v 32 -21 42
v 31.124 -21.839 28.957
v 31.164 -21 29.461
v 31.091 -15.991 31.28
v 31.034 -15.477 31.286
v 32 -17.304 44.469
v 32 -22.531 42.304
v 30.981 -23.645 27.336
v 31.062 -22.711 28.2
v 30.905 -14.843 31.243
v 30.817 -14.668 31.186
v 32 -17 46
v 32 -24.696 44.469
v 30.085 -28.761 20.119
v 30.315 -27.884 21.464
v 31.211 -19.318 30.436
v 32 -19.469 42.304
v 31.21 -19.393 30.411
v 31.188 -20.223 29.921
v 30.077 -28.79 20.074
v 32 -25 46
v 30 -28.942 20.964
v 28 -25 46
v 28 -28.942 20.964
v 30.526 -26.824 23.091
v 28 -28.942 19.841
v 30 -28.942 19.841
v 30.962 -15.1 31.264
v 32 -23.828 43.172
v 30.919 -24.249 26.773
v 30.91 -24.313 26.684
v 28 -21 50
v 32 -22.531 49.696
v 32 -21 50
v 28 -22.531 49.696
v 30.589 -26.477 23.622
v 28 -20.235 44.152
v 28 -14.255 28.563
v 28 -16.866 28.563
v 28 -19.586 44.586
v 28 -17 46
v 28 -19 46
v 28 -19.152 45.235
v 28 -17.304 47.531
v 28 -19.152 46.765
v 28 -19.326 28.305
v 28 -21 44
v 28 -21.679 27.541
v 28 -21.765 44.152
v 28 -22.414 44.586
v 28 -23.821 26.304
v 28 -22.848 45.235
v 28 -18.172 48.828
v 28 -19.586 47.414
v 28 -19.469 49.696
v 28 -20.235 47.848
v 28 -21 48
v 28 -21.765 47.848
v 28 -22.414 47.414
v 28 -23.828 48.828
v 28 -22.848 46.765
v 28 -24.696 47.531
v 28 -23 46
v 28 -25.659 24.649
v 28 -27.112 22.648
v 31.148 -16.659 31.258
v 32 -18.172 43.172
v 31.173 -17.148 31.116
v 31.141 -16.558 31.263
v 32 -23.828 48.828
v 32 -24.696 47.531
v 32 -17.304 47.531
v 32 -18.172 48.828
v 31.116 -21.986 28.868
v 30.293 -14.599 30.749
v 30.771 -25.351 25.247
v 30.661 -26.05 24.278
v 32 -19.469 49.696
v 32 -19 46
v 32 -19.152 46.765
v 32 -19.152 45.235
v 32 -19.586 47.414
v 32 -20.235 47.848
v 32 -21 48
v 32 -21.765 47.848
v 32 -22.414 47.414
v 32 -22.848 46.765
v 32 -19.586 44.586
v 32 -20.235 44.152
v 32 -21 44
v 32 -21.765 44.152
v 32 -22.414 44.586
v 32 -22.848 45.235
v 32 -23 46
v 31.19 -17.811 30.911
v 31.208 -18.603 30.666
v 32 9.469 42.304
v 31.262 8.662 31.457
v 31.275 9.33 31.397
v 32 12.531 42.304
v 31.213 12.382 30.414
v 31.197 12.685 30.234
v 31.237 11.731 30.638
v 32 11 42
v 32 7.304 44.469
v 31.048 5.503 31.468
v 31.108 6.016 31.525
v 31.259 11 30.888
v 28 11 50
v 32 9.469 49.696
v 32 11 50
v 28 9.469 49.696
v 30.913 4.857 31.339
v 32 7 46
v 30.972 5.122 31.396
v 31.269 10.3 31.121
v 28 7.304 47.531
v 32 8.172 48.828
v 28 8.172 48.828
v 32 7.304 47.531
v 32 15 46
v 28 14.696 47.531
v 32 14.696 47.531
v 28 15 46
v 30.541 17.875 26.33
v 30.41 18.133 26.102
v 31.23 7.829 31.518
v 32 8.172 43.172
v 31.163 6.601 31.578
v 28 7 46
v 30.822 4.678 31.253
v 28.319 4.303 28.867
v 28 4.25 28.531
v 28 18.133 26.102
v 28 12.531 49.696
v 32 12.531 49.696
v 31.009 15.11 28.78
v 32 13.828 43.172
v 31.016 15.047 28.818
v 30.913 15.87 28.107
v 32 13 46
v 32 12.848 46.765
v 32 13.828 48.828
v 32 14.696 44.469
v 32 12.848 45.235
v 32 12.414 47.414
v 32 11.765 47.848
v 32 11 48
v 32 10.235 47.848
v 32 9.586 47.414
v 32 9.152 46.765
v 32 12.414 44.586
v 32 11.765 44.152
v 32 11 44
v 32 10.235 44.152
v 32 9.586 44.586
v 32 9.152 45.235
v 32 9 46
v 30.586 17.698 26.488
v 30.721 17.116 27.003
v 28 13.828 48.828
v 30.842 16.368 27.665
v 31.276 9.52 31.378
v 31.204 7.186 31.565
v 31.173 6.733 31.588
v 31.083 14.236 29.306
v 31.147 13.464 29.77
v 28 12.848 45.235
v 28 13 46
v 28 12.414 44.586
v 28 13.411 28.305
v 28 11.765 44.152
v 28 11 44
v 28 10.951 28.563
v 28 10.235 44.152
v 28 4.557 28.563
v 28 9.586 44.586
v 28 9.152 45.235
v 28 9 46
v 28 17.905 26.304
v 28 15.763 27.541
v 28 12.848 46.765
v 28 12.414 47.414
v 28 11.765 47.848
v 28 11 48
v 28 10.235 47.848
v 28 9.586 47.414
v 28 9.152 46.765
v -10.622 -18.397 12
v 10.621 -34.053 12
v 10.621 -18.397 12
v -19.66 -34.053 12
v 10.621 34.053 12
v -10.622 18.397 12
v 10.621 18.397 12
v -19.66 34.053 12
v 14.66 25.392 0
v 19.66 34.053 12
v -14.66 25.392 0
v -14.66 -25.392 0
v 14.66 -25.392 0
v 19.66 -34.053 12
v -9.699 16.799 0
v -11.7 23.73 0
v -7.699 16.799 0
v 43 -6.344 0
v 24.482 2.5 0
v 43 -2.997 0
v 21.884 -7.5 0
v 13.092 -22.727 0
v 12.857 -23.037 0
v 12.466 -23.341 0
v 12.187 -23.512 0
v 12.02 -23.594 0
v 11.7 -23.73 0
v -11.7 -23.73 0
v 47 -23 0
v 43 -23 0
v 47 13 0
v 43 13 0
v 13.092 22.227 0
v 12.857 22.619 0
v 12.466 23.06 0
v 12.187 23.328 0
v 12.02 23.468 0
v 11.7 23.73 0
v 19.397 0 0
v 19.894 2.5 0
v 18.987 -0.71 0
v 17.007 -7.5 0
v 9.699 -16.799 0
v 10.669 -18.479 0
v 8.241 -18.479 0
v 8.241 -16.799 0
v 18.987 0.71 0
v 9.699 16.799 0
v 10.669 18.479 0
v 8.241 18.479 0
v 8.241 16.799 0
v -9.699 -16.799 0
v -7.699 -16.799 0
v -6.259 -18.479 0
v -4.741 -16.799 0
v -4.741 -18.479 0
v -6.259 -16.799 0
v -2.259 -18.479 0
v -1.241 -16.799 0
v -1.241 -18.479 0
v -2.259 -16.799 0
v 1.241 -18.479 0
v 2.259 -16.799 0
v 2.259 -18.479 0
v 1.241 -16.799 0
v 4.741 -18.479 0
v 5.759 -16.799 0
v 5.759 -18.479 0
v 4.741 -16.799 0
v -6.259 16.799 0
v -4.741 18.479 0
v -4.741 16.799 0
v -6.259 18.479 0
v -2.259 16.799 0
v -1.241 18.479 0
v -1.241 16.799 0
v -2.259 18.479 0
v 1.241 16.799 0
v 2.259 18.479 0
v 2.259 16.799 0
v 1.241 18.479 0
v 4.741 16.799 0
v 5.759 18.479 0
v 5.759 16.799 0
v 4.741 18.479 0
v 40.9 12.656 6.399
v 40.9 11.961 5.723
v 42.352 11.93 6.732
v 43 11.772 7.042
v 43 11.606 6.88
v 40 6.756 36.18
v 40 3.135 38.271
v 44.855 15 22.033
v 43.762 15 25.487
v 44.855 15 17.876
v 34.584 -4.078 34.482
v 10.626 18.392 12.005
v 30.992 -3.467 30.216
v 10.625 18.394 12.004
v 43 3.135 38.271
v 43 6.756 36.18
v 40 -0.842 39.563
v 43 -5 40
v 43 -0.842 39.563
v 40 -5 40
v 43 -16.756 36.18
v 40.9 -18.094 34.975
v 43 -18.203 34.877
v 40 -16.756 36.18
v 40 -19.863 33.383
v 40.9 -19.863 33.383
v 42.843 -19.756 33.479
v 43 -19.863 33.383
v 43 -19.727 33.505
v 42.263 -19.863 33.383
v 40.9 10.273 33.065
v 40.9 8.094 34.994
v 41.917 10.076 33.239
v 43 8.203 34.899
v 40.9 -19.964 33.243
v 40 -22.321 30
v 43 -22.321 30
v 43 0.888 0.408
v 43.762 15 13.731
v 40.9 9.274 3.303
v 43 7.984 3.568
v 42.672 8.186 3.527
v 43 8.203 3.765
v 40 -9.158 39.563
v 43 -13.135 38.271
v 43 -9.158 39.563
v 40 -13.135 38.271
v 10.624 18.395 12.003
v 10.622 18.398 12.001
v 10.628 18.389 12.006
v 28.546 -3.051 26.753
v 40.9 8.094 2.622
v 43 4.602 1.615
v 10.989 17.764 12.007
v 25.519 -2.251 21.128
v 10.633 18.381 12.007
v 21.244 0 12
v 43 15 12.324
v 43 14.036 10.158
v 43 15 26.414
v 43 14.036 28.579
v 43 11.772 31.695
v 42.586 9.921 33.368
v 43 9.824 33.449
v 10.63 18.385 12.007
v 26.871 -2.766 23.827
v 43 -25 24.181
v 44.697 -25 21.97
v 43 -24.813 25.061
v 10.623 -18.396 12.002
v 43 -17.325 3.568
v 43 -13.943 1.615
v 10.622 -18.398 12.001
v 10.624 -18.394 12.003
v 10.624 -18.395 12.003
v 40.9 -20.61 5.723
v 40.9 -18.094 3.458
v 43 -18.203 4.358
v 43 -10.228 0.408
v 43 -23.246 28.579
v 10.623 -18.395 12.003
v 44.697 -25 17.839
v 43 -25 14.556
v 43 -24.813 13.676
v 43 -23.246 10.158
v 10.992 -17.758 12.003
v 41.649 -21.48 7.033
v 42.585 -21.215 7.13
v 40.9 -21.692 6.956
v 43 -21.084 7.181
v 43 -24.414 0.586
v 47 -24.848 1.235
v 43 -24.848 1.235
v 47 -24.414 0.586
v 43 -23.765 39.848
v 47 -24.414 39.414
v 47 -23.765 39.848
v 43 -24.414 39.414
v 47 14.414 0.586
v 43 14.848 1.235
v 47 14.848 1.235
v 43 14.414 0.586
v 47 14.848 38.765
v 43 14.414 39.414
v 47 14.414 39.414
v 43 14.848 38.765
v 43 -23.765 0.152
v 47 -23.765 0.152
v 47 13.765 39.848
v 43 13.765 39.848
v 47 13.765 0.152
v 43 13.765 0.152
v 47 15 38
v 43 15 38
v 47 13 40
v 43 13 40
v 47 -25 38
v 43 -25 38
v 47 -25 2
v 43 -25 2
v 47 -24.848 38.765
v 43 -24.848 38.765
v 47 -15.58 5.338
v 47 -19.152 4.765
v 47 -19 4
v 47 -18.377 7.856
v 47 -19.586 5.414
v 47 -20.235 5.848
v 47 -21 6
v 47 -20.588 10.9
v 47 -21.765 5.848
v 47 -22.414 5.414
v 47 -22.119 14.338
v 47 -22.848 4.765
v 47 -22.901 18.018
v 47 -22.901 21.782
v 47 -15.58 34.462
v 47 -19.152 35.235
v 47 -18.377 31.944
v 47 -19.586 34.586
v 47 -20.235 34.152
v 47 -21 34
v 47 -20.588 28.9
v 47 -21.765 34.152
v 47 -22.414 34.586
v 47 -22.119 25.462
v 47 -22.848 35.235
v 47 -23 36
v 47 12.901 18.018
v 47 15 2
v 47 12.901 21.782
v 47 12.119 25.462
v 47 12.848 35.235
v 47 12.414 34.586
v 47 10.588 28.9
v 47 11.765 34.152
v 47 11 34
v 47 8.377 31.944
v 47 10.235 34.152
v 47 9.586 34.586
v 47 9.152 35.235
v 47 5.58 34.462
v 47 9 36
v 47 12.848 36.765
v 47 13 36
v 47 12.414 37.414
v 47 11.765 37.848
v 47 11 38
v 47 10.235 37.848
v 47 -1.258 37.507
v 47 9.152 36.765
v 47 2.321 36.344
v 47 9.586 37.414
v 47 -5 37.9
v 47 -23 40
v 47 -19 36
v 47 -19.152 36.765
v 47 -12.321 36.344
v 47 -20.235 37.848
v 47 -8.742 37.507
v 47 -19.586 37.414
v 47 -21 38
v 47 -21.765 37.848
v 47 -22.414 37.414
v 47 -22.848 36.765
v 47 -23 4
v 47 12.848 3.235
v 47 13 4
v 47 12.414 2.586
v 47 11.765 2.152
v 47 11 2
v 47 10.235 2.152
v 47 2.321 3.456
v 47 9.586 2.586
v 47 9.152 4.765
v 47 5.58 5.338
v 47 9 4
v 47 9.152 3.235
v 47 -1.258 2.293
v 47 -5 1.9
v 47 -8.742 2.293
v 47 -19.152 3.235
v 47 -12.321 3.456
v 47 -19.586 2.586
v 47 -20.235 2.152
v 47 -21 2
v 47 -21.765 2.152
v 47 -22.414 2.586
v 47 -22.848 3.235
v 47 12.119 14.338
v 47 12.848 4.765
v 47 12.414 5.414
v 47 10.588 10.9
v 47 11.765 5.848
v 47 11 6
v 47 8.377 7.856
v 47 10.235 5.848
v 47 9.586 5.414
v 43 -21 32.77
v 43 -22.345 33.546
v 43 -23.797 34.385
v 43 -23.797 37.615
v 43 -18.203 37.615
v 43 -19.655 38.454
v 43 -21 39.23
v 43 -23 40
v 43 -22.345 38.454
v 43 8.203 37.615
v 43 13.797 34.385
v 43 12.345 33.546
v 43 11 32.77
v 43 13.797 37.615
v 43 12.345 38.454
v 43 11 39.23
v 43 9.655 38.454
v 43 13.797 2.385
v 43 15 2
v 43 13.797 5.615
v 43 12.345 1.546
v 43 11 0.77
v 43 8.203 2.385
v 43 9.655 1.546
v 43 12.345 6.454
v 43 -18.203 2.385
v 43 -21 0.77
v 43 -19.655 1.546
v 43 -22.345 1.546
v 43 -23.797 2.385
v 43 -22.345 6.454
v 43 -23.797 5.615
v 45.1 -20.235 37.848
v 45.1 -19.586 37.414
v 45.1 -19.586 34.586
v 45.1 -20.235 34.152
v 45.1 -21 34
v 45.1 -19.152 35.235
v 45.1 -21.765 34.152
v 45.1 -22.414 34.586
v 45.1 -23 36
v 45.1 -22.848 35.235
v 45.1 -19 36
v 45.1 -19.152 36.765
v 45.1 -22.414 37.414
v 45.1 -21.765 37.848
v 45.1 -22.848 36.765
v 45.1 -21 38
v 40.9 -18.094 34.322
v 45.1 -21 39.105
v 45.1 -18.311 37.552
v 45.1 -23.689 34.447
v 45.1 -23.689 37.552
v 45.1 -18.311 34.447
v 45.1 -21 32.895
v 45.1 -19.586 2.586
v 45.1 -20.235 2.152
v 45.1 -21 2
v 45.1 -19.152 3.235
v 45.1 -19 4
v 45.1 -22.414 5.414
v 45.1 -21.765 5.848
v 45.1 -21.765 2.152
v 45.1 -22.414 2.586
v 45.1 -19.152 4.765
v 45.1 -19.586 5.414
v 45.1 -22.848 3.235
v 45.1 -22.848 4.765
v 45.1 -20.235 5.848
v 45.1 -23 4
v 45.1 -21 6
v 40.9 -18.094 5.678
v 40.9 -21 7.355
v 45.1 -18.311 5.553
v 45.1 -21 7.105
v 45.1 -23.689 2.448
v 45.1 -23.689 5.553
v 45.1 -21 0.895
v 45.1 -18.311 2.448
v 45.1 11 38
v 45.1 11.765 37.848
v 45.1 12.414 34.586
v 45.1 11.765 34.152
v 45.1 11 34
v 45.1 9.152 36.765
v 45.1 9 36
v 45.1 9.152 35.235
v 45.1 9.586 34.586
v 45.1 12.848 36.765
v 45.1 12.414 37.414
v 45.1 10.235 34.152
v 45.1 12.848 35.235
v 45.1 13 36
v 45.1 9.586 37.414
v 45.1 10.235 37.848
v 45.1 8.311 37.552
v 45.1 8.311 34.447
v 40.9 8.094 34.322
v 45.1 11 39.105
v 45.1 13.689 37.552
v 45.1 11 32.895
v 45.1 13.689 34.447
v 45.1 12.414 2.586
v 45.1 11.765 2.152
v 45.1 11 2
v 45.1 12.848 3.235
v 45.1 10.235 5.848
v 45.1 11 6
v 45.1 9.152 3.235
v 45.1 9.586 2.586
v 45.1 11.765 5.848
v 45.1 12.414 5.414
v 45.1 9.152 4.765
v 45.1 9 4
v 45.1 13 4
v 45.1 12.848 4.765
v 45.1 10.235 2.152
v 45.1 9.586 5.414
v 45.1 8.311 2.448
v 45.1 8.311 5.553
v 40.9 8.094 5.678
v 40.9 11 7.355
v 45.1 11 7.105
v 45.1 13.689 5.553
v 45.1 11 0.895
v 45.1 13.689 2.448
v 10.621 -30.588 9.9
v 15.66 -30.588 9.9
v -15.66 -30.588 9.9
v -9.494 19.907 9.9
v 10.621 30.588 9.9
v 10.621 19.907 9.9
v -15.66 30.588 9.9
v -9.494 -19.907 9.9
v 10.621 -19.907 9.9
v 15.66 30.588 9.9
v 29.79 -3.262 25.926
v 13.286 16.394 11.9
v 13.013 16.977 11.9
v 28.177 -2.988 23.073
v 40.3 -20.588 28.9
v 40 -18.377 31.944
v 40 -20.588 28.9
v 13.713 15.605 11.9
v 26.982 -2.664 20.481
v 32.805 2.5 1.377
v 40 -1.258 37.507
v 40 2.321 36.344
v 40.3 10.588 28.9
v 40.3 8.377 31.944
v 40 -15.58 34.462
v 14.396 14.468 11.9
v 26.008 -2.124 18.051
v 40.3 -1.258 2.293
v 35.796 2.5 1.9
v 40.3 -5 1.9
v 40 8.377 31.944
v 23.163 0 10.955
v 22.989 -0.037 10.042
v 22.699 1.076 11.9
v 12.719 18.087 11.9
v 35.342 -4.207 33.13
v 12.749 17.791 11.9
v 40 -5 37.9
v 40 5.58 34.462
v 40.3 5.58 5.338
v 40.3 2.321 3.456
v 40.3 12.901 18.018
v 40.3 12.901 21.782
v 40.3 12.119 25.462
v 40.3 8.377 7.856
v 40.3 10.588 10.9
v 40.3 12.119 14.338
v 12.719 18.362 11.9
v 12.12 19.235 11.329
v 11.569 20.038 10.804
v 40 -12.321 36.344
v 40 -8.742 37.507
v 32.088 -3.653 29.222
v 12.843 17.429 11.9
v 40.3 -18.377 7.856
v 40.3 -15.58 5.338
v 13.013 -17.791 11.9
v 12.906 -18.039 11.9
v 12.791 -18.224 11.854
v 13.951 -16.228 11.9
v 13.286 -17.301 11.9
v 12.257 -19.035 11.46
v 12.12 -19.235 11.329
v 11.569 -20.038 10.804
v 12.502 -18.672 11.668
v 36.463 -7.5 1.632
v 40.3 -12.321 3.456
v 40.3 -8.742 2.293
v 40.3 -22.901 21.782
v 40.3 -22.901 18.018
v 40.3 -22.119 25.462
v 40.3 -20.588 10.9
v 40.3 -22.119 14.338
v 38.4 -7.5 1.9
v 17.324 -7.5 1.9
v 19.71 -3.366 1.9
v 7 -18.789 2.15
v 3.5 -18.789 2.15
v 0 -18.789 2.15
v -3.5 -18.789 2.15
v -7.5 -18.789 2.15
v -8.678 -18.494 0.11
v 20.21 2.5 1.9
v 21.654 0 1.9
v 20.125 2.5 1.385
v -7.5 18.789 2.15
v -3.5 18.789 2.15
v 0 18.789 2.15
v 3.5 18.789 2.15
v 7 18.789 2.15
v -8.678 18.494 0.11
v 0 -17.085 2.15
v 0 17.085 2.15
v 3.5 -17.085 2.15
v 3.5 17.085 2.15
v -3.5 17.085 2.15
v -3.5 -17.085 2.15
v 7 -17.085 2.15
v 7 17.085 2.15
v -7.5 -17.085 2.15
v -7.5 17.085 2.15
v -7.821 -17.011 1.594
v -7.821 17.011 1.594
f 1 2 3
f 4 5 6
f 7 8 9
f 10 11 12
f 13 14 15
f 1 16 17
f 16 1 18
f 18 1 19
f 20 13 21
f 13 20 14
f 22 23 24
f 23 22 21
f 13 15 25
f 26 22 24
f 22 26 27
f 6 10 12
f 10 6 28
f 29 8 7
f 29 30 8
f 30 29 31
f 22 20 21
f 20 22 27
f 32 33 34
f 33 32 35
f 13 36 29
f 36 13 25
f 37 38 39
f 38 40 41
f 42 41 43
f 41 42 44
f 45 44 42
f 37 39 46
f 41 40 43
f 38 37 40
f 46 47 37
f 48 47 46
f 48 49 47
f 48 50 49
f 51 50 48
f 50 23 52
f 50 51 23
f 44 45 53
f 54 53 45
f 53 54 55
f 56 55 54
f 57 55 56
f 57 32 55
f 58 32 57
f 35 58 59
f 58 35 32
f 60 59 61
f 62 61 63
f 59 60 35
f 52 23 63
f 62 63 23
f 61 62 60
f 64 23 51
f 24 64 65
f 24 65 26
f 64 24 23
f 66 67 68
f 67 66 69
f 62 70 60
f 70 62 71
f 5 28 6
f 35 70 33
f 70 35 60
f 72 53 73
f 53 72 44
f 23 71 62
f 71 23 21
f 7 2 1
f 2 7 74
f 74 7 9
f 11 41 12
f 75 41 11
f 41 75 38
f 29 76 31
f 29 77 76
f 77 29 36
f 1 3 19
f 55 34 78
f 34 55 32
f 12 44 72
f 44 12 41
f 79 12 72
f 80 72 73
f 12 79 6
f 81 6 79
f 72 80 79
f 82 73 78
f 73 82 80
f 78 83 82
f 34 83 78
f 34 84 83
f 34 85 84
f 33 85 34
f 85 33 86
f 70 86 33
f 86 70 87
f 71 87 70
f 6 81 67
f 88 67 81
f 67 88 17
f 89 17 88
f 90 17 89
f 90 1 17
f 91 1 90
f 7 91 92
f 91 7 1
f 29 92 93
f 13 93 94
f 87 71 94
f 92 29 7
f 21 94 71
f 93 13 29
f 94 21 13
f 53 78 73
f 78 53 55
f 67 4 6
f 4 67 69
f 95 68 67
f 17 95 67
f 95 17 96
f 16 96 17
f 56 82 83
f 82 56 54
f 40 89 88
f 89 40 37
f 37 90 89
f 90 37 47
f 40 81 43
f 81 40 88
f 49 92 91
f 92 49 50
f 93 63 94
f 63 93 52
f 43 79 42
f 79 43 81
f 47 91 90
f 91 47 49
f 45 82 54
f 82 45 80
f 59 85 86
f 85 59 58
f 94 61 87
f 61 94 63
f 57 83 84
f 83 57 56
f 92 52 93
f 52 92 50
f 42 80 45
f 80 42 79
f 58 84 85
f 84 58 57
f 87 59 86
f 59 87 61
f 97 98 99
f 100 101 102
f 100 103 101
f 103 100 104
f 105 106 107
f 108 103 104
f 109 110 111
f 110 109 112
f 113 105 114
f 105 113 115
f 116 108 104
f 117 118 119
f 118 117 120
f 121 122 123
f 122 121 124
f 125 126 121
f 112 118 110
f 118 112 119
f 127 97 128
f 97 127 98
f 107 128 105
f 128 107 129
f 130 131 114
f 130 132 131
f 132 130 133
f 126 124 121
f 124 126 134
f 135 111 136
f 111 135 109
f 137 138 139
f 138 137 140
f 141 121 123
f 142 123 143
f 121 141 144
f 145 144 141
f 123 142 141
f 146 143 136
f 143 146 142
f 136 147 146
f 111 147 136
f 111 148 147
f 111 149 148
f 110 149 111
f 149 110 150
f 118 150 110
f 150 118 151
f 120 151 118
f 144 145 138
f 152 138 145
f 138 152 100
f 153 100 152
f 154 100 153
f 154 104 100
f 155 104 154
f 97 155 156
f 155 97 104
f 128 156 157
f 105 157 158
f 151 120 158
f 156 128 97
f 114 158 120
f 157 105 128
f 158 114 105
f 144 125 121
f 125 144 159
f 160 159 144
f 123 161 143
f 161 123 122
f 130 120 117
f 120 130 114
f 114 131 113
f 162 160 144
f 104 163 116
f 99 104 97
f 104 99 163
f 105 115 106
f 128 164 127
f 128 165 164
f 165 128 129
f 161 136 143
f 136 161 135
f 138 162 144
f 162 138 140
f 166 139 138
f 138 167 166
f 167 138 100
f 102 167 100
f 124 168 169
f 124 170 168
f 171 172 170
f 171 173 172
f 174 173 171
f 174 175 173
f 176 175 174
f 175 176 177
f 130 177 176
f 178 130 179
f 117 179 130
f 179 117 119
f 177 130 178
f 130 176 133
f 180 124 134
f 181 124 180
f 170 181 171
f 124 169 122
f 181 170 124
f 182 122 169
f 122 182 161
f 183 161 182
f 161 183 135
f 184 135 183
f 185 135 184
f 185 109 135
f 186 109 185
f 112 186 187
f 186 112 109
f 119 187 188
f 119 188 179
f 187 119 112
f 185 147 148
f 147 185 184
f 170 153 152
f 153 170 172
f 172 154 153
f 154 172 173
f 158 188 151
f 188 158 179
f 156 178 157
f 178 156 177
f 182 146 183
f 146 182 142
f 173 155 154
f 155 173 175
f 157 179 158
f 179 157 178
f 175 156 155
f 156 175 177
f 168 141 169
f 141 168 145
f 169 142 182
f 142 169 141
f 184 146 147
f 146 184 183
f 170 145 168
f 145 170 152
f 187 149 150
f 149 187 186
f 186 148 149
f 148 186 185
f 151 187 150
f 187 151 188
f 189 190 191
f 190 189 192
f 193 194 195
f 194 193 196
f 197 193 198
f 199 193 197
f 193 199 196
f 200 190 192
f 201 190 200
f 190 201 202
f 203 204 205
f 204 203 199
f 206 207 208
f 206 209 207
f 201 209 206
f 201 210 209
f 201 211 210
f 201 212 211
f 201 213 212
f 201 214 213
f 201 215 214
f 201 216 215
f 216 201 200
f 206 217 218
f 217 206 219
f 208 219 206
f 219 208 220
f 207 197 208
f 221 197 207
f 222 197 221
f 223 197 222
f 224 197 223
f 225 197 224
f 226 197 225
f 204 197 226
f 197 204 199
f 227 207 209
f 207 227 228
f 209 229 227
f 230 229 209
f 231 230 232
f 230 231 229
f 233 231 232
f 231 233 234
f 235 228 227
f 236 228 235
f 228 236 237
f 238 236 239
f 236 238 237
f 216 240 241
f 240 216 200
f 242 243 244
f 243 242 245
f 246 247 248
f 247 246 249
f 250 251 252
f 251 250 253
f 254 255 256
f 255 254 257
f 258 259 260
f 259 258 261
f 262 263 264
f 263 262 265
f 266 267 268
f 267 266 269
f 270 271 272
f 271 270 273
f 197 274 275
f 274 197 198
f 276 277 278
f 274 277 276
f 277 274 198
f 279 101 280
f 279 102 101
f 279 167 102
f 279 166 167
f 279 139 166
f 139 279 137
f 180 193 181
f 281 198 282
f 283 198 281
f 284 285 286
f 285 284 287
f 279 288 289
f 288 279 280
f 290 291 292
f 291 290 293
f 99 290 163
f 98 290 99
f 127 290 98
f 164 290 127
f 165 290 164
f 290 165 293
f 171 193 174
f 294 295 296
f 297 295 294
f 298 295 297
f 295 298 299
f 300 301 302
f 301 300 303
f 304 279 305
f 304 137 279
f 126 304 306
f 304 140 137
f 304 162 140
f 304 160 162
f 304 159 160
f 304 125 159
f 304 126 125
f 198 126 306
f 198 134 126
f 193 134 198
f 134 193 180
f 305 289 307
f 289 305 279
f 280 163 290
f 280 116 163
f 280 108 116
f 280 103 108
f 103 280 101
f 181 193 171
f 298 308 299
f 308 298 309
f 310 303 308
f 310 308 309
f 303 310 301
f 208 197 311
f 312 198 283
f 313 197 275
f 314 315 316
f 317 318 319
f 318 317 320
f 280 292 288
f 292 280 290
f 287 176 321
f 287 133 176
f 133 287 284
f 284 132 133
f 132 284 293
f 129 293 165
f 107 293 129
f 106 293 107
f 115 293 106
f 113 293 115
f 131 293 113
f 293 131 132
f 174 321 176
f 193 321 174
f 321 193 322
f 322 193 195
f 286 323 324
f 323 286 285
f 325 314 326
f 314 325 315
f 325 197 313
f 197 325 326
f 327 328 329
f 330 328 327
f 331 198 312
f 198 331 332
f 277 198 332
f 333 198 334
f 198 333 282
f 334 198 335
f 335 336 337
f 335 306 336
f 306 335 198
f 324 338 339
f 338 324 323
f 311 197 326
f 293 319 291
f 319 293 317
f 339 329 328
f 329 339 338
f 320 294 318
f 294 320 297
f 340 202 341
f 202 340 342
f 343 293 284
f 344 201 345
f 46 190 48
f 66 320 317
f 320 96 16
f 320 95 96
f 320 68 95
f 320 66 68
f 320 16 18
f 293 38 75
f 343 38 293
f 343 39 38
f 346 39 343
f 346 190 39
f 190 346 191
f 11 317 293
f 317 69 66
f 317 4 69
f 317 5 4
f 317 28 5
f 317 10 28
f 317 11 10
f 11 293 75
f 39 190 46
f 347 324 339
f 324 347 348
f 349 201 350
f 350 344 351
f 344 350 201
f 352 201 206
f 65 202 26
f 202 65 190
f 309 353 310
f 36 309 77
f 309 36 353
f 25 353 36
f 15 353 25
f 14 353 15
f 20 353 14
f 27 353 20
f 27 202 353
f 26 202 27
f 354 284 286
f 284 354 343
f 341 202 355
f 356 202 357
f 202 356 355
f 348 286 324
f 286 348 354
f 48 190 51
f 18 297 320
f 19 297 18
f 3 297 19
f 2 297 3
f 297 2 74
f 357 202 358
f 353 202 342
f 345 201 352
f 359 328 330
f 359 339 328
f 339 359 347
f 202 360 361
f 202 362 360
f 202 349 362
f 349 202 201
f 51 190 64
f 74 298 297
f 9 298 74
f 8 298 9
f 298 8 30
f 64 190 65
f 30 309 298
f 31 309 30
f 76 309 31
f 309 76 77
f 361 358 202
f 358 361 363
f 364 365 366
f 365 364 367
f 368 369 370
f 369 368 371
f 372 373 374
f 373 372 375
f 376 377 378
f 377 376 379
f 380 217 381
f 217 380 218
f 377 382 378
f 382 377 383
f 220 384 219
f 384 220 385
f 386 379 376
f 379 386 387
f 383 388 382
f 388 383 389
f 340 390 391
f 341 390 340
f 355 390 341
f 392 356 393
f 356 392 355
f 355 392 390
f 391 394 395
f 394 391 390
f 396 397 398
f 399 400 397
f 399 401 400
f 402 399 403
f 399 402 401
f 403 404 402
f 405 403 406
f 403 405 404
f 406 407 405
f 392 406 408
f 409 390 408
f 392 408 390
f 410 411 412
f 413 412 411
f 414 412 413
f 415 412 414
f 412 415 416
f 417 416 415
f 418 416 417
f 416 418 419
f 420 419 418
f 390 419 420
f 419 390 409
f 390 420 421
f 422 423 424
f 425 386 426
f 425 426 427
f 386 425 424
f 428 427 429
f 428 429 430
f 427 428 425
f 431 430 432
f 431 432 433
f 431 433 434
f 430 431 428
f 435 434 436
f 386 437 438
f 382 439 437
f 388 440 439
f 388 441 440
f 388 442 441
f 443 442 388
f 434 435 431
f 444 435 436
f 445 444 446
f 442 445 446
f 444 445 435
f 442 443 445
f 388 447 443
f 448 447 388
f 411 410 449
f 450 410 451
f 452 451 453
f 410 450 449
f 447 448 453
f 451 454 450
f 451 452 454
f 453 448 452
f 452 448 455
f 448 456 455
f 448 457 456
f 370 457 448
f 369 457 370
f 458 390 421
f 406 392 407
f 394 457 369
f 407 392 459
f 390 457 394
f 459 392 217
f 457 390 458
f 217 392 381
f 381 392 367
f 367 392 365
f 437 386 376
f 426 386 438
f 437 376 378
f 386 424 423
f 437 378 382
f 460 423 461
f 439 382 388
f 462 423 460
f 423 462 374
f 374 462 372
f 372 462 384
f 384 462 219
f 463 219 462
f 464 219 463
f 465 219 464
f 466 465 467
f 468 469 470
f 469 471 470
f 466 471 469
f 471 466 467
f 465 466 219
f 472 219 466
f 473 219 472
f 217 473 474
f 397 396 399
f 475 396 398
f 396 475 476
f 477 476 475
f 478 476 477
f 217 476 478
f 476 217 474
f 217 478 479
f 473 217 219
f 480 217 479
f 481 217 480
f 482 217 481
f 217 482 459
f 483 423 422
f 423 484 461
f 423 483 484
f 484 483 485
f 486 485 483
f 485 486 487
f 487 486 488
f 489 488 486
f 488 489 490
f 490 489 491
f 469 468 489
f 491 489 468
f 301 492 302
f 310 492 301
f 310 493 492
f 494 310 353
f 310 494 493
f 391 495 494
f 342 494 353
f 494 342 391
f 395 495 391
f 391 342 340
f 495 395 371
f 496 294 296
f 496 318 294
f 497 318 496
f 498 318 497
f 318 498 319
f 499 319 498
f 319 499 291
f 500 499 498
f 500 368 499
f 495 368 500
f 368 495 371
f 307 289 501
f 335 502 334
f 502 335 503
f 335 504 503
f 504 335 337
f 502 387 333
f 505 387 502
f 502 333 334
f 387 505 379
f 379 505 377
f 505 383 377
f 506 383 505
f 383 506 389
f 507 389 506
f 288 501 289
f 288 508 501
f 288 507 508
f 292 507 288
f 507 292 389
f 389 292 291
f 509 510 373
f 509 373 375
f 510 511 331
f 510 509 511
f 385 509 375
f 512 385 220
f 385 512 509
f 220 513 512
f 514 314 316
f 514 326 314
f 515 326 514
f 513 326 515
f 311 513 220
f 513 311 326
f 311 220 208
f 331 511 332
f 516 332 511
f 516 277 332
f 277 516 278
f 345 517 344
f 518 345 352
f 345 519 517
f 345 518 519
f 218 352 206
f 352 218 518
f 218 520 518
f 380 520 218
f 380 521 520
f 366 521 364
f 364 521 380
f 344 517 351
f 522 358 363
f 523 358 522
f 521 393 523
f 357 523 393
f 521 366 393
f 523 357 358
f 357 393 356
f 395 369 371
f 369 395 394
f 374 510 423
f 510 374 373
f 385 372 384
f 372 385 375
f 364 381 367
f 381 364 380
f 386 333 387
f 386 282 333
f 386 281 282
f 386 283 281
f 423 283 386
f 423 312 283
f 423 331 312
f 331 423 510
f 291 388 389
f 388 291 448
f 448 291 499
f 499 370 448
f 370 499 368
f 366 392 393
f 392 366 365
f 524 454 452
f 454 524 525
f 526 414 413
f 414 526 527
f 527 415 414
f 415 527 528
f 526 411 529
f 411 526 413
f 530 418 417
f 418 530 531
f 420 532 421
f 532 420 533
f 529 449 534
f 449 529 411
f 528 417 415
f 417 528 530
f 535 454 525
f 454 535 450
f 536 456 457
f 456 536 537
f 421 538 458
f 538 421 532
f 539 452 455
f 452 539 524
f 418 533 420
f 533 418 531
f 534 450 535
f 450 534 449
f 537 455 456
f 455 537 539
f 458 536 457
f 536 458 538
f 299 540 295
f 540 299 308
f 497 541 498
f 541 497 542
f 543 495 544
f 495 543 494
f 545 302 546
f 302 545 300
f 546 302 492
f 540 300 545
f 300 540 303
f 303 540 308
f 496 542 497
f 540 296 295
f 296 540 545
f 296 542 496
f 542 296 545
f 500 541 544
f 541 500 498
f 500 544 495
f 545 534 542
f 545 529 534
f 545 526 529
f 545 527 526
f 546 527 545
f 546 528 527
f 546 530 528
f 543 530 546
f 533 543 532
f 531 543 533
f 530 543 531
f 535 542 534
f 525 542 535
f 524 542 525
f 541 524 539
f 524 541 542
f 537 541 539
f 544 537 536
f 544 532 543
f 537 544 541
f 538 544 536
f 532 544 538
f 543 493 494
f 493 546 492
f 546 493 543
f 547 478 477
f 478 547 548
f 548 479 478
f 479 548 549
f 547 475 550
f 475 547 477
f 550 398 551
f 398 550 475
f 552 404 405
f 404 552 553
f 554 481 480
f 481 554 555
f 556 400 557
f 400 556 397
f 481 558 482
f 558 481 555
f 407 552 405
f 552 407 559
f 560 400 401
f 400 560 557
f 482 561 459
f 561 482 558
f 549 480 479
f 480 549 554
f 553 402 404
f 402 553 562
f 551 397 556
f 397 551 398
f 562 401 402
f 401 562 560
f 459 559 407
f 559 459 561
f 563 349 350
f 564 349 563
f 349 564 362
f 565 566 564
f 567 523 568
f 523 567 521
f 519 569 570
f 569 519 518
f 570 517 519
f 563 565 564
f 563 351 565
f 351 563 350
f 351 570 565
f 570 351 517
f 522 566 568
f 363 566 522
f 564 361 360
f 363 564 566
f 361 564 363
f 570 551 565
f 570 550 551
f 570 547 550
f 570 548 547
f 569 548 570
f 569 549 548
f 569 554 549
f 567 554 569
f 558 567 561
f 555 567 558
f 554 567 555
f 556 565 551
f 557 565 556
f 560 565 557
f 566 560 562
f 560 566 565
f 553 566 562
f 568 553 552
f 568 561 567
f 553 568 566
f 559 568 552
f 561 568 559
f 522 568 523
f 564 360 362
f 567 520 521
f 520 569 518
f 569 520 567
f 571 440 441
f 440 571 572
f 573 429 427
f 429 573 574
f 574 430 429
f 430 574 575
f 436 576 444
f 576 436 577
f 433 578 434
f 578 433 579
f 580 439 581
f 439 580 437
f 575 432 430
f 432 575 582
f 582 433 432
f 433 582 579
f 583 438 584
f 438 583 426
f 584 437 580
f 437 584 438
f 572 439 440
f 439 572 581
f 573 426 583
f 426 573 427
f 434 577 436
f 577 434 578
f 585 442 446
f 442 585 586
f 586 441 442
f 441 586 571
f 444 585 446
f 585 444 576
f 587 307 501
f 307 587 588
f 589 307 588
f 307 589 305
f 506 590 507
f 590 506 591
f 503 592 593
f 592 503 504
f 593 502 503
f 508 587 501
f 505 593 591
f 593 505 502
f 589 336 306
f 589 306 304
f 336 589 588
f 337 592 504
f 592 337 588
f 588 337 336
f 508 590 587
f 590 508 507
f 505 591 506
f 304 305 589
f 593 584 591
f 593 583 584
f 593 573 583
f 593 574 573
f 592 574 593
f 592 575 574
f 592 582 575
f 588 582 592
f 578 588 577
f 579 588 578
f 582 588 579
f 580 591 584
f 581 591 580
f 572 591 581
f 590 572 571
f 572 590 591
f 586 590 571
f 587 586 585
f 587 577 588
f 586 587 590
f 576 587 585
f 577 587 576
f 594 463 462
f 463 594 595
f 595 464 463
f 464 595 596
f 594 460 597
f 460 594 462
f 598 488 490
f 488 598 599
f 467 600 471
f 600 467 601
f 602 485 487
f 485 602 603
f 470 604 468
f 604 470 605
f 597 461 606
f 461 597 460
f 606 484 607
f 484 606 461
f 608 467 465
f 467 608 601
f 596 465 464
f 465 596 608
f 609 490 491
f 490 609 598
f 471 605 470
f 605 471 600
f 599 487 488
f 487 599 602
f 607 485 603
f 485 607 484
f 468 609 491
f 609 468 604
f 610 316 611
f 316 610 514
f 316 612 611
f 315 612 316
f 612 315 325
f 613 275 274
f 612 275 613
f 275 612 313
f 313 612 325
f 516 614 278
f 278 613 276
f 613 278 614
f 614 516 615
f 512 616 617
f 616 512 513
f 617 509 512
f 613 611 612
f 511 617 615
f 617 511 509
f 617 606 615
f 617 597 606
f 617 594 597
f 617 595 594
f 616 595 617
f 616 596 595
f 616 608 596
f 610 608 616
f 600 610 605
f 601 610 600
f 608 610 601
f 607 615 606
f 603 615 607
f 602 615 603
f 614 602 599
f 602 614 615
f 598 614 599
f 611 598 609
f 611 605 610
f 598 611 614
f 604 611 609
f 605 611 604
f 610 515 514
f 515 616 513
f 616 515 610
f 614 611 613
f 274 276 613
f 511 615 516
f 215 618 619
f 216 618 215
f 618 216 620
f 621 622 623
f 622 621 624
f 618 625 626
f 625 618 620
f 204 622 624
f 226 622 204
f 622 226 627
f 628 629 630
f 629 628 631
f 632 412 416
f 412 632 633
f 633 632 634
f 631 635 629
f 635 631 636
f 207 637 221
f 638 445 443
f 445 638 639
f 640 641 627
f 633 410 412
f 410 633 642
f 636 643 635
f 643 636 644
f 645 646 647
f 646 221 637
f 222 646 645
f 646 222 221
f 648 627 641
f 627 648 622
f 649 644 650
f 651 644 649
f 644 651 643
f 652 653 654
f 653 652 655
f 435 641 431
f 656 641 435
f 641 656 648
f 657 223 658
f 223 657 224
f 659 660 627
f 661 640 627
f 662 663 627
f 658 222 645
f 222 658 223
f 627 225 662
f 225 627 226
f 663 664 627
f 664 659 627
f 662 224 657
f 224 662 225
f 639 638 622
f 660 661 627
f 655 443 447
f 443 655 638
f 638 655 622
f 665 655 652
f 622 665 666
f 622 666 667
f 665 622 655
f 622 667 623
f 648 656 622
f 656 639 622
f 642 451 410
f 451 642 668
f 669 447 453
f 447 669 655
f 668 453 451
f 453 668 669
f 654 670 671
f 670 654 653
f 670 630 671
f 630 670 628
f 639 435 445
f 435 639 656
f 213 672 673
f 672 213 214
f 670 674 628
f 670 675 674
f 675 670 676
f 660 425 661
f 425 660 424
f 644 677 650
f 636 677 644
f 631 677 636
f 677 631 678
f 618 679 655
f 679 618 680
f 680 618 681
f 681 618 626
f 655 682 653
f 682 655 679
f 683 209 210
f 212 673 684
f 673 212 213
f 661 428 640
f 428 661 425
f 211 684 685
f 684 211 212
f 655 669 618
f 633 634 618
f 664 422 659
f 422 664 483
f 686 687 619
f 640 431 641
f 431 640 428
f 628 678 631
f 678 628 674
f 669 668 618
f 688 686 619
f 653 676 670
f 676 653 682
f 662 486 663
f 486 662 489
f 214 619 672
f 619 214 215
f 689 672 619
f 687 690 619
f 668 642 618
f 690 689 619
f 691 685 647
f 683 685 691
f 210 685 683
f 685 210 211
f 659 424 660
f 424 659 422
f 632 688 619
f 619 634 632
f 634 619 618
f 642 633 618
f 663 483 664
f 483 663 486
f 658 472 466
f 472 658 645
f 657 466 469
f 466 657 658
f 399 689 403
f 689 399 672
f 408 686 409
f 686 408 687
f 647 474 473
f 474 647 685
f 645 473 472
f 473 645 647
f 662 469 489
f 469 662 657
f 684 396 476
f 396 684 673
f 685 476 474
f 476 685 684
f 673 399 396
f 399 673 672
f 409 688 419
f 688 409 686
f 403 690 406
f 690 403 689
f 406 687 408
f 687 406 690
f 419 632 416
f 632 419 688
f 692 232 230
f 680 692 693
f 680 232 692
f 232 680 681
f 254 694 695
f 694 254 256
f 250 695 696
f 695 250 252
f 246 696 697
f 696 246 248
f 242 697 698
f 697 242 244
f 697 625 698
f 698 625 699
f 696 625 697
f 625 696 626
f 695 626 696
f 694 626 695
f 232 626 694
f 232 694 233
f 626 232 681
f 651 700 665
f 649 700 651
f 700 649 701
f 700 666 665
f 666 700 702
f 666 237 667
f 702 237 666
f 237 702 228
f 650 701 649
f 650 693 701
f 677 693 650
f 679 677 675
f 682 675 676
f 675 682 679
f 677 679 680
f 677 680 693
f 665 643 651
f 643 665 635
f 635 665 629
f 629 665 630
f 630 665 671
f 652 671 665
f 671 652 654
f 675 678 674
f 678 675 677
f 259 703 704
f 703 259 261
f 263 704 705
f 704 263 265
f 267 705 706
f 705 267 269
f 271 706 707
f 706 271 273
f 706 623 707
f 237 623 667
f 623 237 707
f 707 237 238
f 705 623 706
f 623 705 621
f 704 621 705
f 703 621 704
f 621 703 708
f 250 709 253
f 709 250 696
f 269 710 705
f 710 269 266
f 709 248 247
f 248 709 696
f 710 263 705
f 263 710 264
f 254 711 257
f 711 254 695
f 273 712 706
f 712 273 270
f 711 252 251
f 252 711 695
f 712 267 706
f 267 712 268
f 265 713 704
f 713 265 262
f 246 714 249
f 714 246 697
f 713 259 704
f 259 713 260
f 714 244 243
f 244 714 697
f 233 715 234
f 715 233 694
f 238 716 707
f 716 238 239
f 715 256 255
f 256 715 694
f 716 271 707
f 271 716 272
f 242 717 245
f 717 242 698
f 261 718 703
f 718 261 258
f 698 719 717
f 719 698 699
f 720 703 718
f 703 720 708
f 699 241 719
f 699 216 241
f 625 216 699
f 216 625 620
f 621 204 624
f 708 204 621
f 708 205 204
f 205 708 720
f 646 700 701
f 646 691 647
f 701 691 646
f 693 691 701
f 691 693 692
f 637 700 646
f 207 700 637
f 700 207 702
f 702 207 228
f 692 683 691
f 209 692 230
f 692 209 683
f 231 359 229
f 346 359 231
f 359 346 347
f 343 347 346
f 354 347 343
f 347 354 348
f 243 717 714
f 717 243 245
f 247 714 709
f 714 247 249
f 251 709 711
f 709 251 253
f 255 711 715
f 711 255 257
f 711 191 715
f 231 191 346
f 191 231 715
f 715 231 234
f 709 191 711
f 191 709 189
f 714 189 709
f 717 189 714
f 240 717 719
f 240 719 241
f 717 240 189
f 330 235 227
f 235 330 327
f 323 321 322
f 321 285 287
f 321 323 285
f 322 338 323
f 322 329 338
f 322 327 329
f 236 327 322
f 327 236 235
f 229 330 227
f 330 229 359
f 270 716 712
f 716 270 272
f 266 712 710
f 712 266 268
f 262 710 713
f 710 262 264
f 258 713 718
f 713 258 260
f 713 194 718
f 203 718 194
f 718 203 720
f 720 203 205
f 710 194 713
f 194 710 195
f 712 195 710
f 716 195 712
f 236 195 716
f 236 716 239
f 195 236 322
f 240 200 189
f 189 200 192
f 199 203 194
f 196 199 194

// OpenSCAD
//$fn=180; // Uncomment before exporting for fine finish

hot_rad = 30/2/cos(30);
hotend_x=25;
fan_x = 15+5;

hotend_y=-5;

thickness = 10;
wall=2;
slop=.2;

fan_hole = (40-wall-wall)/2;
//mount_drop = 18; // E3Dv5
mount_drop = 10; // E3Dv6
fan_z = fan_hole+wall;

fan_mount();
//bowden_fan();
//cyclops_fan();

%cylinder(r=hot_rad, h=20, center=true);
%translate([-23,0,0]) cylinder(r=hot_rad, h=20, center=true);

m3_cap_rad = 4;
m3_rad = 2;
m3_nut_rad = 6.01/2+.1;

facets = 6;

duct_angle=-5;
duct_jut = -5;

module fan_mount(){
    difference(){
        union(){
            //core
            cylinder(r1=hot_rad+thickness+wall, r2=hot_rad+thickness*2+wall, h=thickness+wall, $fn=facets);
            
            hull(){
                intersection(){
                    difference(){
                        cylinder(r1=hot_rad+thickness+wall, r2=hot_rad+thickness*2+wall, h=thickness+wall, $fn=facets);
                        translate([0,0,-.5]) cylinder(r1=hot_rad+wall, r2=hot_rad+wall+wall, h=thickness+wall+1, $fn=facets);
                    }
                    translate([50+hot_rad-6.7,50,50]) cube([100,100,100], center=true);
                }
                translate([hotend_x+fan_x-5,hotend_y,fan_z]) rotate([0,90,0]) cylinder(r=fan_hole+wall, h=5);
            }
            
            hull(){
                intersection(){
                    difference(){
                        cylinder(r1=hot_rad+thickness+wall, r2=hot_rad+thickness*2+wall, h=thickness+wall, $fn=facets);
                        translate([0,0,-.5]) cylinder(r1=hot_rad+wall, r2=hot_rad+wall+wall, h=thickness+wall+1, $fn=facets);
                    }
                    translate([50+hot_rad-6.7,-50,50]) cube([100,100,100], center=true);
                }
                translate([hotend_x+fan_x-5,hotend_y,fan_z]) rotate([0,90,0]) cylinder(r=fan_hole+wall, h=5);
            }
            
            //fan mount
            translate([hotend_x+fan_x,hotend_y,fan_z]) rotate([0,90,0]){
                hull() for(i=[0:90:359]) rotate([0,0,i]) {
                    #translate([20-wall,20-wall,-wall]) cylinder(r=wall,h=wall*2, $fn=16);
                }    
            }
            
            //mounting lugs above fan
            translate([hotend_x+fan_x,hotend_y,fan_z]) rotate([0,90,0]){
                for(i=[-16, 16]) difference(){
                    hull(){
                        translate([-16-mount_drop,i,-fan_x+3]) cylinder(r=m3_rad+wall, h=wall*2, $fn=16);
                        translate([0,i,-fan_x+3]) cylinder(r=m3_cap_rad*2, h=wall);
                    }
                    translate([-16-mount_drop,i,-fan_x+3-.1]) cylinder(r=m3_rad, h=wall*2+1, $fn=16);
                }
            }
        }
        
        //center cutout
        translate([0,0,-.5]) cylinder(r1=hot_rad+wall, r2=hot_rad+wall+wall, h=thickness+wall+1, $fn=facets);
                
        //front cutout
        translate([-(hot_rad+thickness*2+wall),0,0]) cylinder(r=hot_rad+thickness*2+wall, h=thickness+wall*10, center=true, $fn=facets);
        
        //fan holes
        translate([hotend_x+fan_x,hotend_y,fan_z]) rotate([0,90,0]){
            for(i=[-16, 16]) for(j=[-16, 16]) {
                #translate([j,i,-.1]) cylinder(r=m3_rad, h=wall+.2, $fn=16);
                translate([j,i,-wall*2-.1]) cylinder(r2=m3_nut_rad, r1=m3_nut_rad+.25, h=wall*2+.2, $fn=6);
            }
        }
        
        //air path
        translate([0,0,-.1]) difference(){
            union(){
                translate([-wall,0,0]) cylinder(r1=hot_rad+thickness, r2=hot_rad+thickness*2-wall, h=thickness, $fn=facets);
                hull(){
                    intersection(){
                        difference(){
                            translate([-wall,0,0]) cylinder(r1=hot_rad+thickness, r2=hot_rad+thickness*2-wall, h=thickness, $fn=facets);
                            translate([0,0,-.5]) cylinder(r1=hot_rad+wall*2, r2=hot_rad+wall*3, h=thickness+wall+1, $fn=facets);
                        }
                        translate([50+hot_rad-6.7,50,50]) cube([100,100,100], center=true);
                    }
                    translate([hotend_x+fan_x-5,hotend_y,fan_z]) rotate([0,90,0]) cylinder(r=fan_hole, h=.3);
                }
                
                hull(){
                    intersection(){
                        difference(){
                            translate([-wall,0,0]) cylinder(r1=hot_rad+thickness, r2=hot_rad+thickness*2-wall, h=thickness, $fn=facets);
                            translate([0,0,-.5]) cylinder(r1=hot_rad+wall+wall, r2=hot_rad+wall+wall+wall, h=thickness+wall+1, $fn=facets);
                        }
                        translate([50+hot_rad-6.7,-50,50]) cube([100,100,100], center=true);
                    }
                    translate([hotend_x+fan_x-5,hotend_y,fan_z]) rotate([0,90,0]) cylinder(r=fan_hole, h=.3);
                }
                
                translate([hotend_x+fan_x-5,hotend_y,fan_z]) rotate([0,90,0]) cylinder(r=fan_hole, h=wall+1+5);
            }
            difference () {
                cylinder(r1=hot_rad+wall+wall, r2=hot_rad+wall+wall+wall, h=thickness+wall, $fn=facets);
                #translate([0,(hot_rad*2+wall+wall)/2,.75]) rotate([0,-90,90]) cylinder(r=1.5, h=hot_rad*2+wall+wall, $fn=3);
                #translate([3.5,(hot_rad*2+wall+wall)/2,.75]) rotate([0,-90,90]) cylinder(r=1.5, h=hot_rad*2+wall+wall, $fn=3);
                #translate([-3.5,(hot_rad*2+wall+wall)/2,.75]) rotate([0,-90,90]) cylinder(r=1.5, h=hot_rad*2+wall+wall, $fn=3);
                #translate([7,(hot_rad*2+wall+wall)/2,.75]) rotate([0,-90,90]) cylinder(r=1.5, h=hot_rad*2+wall+wall, $fn=3);
                #translate([-7.5,(hot_rad*2+wall+wall)/2,.75]) rotate([0,-90,90]) cylinder(r=1.5, h=hot_rad*2+wall+wall, $fn=3);
            }
            translate([-(hot_rad+thickness*2),0,0]) cylinder(r=hot_rad+thickness*2+wall, h=thickness+wall*10, center=true, $fn=facets);
            translate([0,-5+hotend_y/2,0])cube([100,10,wall]);
        }
    }
}

module bowden_fan(){
    duct_w = 15+slop;
    duct_h = 20+slop;
    duct_offset=38;
    
    mount_height = 46;
    
    offset = -20;
    difference(){
        union(){
            //core
            hull(){
                cylinder(r1=hot_rad+thickness+wall, r2=hot_rad+thickness*2+wall, h=thickness+wall, $fn=facets);
                translate([offset,0,0]) cylinder(r1=hot_rad+thickness+wall, r2=hot_rad+thickness*2+wall, h=thickness+wall, $fn=facets);
            }
            
            //connection to duct
            hull(){
                intersection(){
                    cylinder(r1=hot_rad+thickness+wall, r2=hot_rad+thickness*2+wall, h=thickness+wall, $fn=facets);
                    translate([hot_rad+wall*2,0,0]) cube([1,200,200], center=true);
                }
                translate([duct_offset,duct_jut,duct_h/2+wall]) rotate([0,0,duct_angle]) cube([1,duct_w+wall*2, duct_h+wall*2], center=true);
            }
            
            //the duct connector
            translate([duct_offset,duct_jut,0]) rotate([0,0,duct_angle]) duct();
            
            //mounting lugs
           for(i=[10,-20,-40]) difference(){
                translate([i,hot_rad+wall*2,0]) hull(){
                    translate([5,0,thickness]) rotate([90,0,0]) cylinder(r=m3_cap_rad+wall*2, h=wall, center=true);
                    translate([0,0,mount_height]) rotate([90,0,0]) cylinder(r=m3_cap_rad+wall, h=wall, center=true);
                }
                
                //mounting holes up top
                translate([i,hot_rad+wall*2,mount_height]) rotate([90,0,0]) cylinder(r=m3_rad+slop, h=20, center=true);
            }
        }
        
        //connection to duct airflow
        hull(){
            intersection(){
                translate([0,0,wall]) cylinder(r1=hot_rad+thickness, r2=hot_rad+thickness*2, h=thickness-wall, $fn=facets);
                translate([hot_rad+wall*3,0,0]) cube([1,200,200], center=true);
            }
            translate([duct_offset,duct_jut,duct_h/2+wall]) rotate([0,0,duct_angle]) cube([1.2,duct_w, duct_h], center=true);
        }
        
        //center cutout
        translate([0,0,-.5]) hull(){
            cylinder(r1=hot_rad+wall, r2=hot_rad+wall*3, h=thickness+wall+1, $fn=facets);
            translate([2*offset,0,0]) cylinder(r1=hot_rad+wall, r2=hot_rad+wall*3, h=thickness+wall+1, $fn=facets);
        }
        
        //air path
        difference(){
            //core
            translate([0,0,-.1]) hull(){
                cylinder(r1=hot_rad+thickness, r2=hot_rad+thickness*2-wall, h=thickness, $fn=facets);
                translate([offset+wall,0,0]) cylinder(r1=hot_rad+thickness, r2=hot_rad+thickness*2-wall, h=thickness, $fn=facets);
            }
            
            //keep the center walls in place
            translate([0,0,-.5]) hull(){
                cylinder(r1=hot_rad+wall*2, r2=hot_rad+wall*4, h=thickness+wall+1, $fn=facets);
                translate([2*offset,0,0]) cylinder(r1=hot_rad+wall*2, r2=hot_rad+wall*4, h=thickness+wall+1, $fn=facets);
            }
            
            //bottom on the near side
            translate([10,0,-.5]) cylinder(r1=hot_rad+wall*2, r2=hot_rad+wall*2.5, h=wall+.5, $fn=facets);
        }
    }
}

module cyclops_fan(){
    duct_w = 15+slop;
    duct_h = 20+slop;
    duct_offset=38;
    
    mount_height = 46-1.5;
    mount_offset = 10;
    
    offset = -11;
    difference(){
        union(){
            //core
            hull(){
                cylinder(r1=hot_rad+thickness+wall, r2=hot_rad+thickness*2+wall, h=thickness+wall, $fn=facets);
                translate([offset,0,0]) cylinder(r1=hot_rad+thickness+wall, r2=hot_rad+thickness*2+wall, h=thickness+wall, $fn=facets);
            }
            
            //connection to duct
            hull(){
                intersection(){
                    cylinder(r1=hot_rad+thickness+wall, r2=hot_rad+thickness*2+wall, h=thickness+wall, $fn=facets);
                    translate([hot_rad+wall*2,0,0]) cube([1,200,200], center=true);
                }
                translate([duct_offset,duct_jut,duct_h/2+wall]) rotate([0,0,duct_angle]) cube([1,duct_w+wall*2, duct_h+wall*2], center=true);
            }
            
            //the duct connector
            translate([duct_offset,duct_jut,0]) rotate([0,0,duct_angle]) duct();
            
            //mounting lugs
           for(i=[10-mount_offset,-20-mount_offset]) difference(){
                translate([i,hot_rad+wall*2,0]) hull(){
                    translate([5,0,thickness]) rotate([90,0,0]) cylinder(r=m3_cap_rad+wall*2, h=wall, center=true);
                    translate([0,0,mount_height]) rotate([90,0,0]) cylinder(r=m3_cap_rad+wall, h=wall, center=true);
                }
                
                //mounting holes up top
                translate([i,hot_rad+wall*2,mount_height]) rotate([90,0,0]) cylinder(r=m3_rad+slop, h=20, center=true);
            }
        }
        
        //connection to duct airflow
        hull(){
            intersection(){
                translate([0,0,wall]) cylinder(r1=hot_rad+thickness, r2=hot_rad+thickness*2, h=thickness-wall, $fn=facets);
                translate([hot_rad+wall*3,0,0]) cube([1,200,200], center=true);
            }
            translate([duct_offset,duct_jut,duct_h/2+wall]) rotate([0,0,duct_angle]) cube([1.2,duct_w, duct_h], center=true);
        }
        
        //center cutout
        translate([0,0,-.5]) hull(){
            cylinder(r1=hot_rad+wall, r2=hot_rad+wall*3, h=thickness+wall+1, $fn=facets);
            translate([5*offset,0,0]) cylinder(r1=hot_rad+wall, r2=hot_rad+wall*3, h=thickness+wall+1, $fn=facets);
        }
        
        //air path
        difference(){
            //core
            translate([0,0,-.1]) hull(){
                cylinder(r1=hot_rad+thickness, r2=hot_rad+thickness*2-wall, h=thickness, $fn=facets);
                translate([offset+wall,0,0]) cylinder(r1=hot_rad+thickness, r2=hot_rad+thickness*2-wall, h=thickness, $fn=facets);
            }
            
            //keep the center walls in place
            translate([0,0,-.5]) hull(){
                cylinder(r1=hot_rad+wall*2, r2=hot_rad+wall*4, h=thickness+wall+1, $fn=facets);
                translate([5*offset,0,0]) cylinder(r1=hot_rad+wall*2, r2=hot_rad+wall*4, h=thickness+wall+1, $fn=facets);
            }
            
            //bottom on the near side
            translate([10,0,-.5]) cylinder(r1=hot_rad+wall*2, r2=hot_rad+wall*2.5, h=wall+.5, $fn=facets);
        }
    }
}

module duct(){
    duct_w = 15+slop;
    duct_h = 20+slop;
    rad = 20;
    
    translate([0,0,rad+wall+duct_h/2]) rotate([-90,0,0]) union(){
        intersection(){
            rotate_extrude(angle = 90, convexity = 2){
                translate([rad,0,0])
                difference(){
                    square([duct_h+wall*2, duct_w+wall*2], center=true);
                    square([duct_h, duct_w], center=true);
                }
            }
            translate([0,0,-100]) cube([200,200,200]);
        }
        
        translate([rad,0,0]) rotate([90,0,0]) translate([0,0,8]) difference(){
            hull(){
                translate([0,0,-8]) cube([duct_h+wall*2,duct_w+wall*2,.1], center=true);
                #translate([duct_h/2+wall/2,0,8]) cube([wall,duct_w+wall*2,.1], center=true);
            }
            
            //hollow center
            cube([duct_h,duct_w,16.3], center=true);
            
            //slot for the clip
            translate([wall+1,0,(12-16)/2]) cube([duct_h+wall*2,2,12], center=true);
        }
        
    }
    
}
